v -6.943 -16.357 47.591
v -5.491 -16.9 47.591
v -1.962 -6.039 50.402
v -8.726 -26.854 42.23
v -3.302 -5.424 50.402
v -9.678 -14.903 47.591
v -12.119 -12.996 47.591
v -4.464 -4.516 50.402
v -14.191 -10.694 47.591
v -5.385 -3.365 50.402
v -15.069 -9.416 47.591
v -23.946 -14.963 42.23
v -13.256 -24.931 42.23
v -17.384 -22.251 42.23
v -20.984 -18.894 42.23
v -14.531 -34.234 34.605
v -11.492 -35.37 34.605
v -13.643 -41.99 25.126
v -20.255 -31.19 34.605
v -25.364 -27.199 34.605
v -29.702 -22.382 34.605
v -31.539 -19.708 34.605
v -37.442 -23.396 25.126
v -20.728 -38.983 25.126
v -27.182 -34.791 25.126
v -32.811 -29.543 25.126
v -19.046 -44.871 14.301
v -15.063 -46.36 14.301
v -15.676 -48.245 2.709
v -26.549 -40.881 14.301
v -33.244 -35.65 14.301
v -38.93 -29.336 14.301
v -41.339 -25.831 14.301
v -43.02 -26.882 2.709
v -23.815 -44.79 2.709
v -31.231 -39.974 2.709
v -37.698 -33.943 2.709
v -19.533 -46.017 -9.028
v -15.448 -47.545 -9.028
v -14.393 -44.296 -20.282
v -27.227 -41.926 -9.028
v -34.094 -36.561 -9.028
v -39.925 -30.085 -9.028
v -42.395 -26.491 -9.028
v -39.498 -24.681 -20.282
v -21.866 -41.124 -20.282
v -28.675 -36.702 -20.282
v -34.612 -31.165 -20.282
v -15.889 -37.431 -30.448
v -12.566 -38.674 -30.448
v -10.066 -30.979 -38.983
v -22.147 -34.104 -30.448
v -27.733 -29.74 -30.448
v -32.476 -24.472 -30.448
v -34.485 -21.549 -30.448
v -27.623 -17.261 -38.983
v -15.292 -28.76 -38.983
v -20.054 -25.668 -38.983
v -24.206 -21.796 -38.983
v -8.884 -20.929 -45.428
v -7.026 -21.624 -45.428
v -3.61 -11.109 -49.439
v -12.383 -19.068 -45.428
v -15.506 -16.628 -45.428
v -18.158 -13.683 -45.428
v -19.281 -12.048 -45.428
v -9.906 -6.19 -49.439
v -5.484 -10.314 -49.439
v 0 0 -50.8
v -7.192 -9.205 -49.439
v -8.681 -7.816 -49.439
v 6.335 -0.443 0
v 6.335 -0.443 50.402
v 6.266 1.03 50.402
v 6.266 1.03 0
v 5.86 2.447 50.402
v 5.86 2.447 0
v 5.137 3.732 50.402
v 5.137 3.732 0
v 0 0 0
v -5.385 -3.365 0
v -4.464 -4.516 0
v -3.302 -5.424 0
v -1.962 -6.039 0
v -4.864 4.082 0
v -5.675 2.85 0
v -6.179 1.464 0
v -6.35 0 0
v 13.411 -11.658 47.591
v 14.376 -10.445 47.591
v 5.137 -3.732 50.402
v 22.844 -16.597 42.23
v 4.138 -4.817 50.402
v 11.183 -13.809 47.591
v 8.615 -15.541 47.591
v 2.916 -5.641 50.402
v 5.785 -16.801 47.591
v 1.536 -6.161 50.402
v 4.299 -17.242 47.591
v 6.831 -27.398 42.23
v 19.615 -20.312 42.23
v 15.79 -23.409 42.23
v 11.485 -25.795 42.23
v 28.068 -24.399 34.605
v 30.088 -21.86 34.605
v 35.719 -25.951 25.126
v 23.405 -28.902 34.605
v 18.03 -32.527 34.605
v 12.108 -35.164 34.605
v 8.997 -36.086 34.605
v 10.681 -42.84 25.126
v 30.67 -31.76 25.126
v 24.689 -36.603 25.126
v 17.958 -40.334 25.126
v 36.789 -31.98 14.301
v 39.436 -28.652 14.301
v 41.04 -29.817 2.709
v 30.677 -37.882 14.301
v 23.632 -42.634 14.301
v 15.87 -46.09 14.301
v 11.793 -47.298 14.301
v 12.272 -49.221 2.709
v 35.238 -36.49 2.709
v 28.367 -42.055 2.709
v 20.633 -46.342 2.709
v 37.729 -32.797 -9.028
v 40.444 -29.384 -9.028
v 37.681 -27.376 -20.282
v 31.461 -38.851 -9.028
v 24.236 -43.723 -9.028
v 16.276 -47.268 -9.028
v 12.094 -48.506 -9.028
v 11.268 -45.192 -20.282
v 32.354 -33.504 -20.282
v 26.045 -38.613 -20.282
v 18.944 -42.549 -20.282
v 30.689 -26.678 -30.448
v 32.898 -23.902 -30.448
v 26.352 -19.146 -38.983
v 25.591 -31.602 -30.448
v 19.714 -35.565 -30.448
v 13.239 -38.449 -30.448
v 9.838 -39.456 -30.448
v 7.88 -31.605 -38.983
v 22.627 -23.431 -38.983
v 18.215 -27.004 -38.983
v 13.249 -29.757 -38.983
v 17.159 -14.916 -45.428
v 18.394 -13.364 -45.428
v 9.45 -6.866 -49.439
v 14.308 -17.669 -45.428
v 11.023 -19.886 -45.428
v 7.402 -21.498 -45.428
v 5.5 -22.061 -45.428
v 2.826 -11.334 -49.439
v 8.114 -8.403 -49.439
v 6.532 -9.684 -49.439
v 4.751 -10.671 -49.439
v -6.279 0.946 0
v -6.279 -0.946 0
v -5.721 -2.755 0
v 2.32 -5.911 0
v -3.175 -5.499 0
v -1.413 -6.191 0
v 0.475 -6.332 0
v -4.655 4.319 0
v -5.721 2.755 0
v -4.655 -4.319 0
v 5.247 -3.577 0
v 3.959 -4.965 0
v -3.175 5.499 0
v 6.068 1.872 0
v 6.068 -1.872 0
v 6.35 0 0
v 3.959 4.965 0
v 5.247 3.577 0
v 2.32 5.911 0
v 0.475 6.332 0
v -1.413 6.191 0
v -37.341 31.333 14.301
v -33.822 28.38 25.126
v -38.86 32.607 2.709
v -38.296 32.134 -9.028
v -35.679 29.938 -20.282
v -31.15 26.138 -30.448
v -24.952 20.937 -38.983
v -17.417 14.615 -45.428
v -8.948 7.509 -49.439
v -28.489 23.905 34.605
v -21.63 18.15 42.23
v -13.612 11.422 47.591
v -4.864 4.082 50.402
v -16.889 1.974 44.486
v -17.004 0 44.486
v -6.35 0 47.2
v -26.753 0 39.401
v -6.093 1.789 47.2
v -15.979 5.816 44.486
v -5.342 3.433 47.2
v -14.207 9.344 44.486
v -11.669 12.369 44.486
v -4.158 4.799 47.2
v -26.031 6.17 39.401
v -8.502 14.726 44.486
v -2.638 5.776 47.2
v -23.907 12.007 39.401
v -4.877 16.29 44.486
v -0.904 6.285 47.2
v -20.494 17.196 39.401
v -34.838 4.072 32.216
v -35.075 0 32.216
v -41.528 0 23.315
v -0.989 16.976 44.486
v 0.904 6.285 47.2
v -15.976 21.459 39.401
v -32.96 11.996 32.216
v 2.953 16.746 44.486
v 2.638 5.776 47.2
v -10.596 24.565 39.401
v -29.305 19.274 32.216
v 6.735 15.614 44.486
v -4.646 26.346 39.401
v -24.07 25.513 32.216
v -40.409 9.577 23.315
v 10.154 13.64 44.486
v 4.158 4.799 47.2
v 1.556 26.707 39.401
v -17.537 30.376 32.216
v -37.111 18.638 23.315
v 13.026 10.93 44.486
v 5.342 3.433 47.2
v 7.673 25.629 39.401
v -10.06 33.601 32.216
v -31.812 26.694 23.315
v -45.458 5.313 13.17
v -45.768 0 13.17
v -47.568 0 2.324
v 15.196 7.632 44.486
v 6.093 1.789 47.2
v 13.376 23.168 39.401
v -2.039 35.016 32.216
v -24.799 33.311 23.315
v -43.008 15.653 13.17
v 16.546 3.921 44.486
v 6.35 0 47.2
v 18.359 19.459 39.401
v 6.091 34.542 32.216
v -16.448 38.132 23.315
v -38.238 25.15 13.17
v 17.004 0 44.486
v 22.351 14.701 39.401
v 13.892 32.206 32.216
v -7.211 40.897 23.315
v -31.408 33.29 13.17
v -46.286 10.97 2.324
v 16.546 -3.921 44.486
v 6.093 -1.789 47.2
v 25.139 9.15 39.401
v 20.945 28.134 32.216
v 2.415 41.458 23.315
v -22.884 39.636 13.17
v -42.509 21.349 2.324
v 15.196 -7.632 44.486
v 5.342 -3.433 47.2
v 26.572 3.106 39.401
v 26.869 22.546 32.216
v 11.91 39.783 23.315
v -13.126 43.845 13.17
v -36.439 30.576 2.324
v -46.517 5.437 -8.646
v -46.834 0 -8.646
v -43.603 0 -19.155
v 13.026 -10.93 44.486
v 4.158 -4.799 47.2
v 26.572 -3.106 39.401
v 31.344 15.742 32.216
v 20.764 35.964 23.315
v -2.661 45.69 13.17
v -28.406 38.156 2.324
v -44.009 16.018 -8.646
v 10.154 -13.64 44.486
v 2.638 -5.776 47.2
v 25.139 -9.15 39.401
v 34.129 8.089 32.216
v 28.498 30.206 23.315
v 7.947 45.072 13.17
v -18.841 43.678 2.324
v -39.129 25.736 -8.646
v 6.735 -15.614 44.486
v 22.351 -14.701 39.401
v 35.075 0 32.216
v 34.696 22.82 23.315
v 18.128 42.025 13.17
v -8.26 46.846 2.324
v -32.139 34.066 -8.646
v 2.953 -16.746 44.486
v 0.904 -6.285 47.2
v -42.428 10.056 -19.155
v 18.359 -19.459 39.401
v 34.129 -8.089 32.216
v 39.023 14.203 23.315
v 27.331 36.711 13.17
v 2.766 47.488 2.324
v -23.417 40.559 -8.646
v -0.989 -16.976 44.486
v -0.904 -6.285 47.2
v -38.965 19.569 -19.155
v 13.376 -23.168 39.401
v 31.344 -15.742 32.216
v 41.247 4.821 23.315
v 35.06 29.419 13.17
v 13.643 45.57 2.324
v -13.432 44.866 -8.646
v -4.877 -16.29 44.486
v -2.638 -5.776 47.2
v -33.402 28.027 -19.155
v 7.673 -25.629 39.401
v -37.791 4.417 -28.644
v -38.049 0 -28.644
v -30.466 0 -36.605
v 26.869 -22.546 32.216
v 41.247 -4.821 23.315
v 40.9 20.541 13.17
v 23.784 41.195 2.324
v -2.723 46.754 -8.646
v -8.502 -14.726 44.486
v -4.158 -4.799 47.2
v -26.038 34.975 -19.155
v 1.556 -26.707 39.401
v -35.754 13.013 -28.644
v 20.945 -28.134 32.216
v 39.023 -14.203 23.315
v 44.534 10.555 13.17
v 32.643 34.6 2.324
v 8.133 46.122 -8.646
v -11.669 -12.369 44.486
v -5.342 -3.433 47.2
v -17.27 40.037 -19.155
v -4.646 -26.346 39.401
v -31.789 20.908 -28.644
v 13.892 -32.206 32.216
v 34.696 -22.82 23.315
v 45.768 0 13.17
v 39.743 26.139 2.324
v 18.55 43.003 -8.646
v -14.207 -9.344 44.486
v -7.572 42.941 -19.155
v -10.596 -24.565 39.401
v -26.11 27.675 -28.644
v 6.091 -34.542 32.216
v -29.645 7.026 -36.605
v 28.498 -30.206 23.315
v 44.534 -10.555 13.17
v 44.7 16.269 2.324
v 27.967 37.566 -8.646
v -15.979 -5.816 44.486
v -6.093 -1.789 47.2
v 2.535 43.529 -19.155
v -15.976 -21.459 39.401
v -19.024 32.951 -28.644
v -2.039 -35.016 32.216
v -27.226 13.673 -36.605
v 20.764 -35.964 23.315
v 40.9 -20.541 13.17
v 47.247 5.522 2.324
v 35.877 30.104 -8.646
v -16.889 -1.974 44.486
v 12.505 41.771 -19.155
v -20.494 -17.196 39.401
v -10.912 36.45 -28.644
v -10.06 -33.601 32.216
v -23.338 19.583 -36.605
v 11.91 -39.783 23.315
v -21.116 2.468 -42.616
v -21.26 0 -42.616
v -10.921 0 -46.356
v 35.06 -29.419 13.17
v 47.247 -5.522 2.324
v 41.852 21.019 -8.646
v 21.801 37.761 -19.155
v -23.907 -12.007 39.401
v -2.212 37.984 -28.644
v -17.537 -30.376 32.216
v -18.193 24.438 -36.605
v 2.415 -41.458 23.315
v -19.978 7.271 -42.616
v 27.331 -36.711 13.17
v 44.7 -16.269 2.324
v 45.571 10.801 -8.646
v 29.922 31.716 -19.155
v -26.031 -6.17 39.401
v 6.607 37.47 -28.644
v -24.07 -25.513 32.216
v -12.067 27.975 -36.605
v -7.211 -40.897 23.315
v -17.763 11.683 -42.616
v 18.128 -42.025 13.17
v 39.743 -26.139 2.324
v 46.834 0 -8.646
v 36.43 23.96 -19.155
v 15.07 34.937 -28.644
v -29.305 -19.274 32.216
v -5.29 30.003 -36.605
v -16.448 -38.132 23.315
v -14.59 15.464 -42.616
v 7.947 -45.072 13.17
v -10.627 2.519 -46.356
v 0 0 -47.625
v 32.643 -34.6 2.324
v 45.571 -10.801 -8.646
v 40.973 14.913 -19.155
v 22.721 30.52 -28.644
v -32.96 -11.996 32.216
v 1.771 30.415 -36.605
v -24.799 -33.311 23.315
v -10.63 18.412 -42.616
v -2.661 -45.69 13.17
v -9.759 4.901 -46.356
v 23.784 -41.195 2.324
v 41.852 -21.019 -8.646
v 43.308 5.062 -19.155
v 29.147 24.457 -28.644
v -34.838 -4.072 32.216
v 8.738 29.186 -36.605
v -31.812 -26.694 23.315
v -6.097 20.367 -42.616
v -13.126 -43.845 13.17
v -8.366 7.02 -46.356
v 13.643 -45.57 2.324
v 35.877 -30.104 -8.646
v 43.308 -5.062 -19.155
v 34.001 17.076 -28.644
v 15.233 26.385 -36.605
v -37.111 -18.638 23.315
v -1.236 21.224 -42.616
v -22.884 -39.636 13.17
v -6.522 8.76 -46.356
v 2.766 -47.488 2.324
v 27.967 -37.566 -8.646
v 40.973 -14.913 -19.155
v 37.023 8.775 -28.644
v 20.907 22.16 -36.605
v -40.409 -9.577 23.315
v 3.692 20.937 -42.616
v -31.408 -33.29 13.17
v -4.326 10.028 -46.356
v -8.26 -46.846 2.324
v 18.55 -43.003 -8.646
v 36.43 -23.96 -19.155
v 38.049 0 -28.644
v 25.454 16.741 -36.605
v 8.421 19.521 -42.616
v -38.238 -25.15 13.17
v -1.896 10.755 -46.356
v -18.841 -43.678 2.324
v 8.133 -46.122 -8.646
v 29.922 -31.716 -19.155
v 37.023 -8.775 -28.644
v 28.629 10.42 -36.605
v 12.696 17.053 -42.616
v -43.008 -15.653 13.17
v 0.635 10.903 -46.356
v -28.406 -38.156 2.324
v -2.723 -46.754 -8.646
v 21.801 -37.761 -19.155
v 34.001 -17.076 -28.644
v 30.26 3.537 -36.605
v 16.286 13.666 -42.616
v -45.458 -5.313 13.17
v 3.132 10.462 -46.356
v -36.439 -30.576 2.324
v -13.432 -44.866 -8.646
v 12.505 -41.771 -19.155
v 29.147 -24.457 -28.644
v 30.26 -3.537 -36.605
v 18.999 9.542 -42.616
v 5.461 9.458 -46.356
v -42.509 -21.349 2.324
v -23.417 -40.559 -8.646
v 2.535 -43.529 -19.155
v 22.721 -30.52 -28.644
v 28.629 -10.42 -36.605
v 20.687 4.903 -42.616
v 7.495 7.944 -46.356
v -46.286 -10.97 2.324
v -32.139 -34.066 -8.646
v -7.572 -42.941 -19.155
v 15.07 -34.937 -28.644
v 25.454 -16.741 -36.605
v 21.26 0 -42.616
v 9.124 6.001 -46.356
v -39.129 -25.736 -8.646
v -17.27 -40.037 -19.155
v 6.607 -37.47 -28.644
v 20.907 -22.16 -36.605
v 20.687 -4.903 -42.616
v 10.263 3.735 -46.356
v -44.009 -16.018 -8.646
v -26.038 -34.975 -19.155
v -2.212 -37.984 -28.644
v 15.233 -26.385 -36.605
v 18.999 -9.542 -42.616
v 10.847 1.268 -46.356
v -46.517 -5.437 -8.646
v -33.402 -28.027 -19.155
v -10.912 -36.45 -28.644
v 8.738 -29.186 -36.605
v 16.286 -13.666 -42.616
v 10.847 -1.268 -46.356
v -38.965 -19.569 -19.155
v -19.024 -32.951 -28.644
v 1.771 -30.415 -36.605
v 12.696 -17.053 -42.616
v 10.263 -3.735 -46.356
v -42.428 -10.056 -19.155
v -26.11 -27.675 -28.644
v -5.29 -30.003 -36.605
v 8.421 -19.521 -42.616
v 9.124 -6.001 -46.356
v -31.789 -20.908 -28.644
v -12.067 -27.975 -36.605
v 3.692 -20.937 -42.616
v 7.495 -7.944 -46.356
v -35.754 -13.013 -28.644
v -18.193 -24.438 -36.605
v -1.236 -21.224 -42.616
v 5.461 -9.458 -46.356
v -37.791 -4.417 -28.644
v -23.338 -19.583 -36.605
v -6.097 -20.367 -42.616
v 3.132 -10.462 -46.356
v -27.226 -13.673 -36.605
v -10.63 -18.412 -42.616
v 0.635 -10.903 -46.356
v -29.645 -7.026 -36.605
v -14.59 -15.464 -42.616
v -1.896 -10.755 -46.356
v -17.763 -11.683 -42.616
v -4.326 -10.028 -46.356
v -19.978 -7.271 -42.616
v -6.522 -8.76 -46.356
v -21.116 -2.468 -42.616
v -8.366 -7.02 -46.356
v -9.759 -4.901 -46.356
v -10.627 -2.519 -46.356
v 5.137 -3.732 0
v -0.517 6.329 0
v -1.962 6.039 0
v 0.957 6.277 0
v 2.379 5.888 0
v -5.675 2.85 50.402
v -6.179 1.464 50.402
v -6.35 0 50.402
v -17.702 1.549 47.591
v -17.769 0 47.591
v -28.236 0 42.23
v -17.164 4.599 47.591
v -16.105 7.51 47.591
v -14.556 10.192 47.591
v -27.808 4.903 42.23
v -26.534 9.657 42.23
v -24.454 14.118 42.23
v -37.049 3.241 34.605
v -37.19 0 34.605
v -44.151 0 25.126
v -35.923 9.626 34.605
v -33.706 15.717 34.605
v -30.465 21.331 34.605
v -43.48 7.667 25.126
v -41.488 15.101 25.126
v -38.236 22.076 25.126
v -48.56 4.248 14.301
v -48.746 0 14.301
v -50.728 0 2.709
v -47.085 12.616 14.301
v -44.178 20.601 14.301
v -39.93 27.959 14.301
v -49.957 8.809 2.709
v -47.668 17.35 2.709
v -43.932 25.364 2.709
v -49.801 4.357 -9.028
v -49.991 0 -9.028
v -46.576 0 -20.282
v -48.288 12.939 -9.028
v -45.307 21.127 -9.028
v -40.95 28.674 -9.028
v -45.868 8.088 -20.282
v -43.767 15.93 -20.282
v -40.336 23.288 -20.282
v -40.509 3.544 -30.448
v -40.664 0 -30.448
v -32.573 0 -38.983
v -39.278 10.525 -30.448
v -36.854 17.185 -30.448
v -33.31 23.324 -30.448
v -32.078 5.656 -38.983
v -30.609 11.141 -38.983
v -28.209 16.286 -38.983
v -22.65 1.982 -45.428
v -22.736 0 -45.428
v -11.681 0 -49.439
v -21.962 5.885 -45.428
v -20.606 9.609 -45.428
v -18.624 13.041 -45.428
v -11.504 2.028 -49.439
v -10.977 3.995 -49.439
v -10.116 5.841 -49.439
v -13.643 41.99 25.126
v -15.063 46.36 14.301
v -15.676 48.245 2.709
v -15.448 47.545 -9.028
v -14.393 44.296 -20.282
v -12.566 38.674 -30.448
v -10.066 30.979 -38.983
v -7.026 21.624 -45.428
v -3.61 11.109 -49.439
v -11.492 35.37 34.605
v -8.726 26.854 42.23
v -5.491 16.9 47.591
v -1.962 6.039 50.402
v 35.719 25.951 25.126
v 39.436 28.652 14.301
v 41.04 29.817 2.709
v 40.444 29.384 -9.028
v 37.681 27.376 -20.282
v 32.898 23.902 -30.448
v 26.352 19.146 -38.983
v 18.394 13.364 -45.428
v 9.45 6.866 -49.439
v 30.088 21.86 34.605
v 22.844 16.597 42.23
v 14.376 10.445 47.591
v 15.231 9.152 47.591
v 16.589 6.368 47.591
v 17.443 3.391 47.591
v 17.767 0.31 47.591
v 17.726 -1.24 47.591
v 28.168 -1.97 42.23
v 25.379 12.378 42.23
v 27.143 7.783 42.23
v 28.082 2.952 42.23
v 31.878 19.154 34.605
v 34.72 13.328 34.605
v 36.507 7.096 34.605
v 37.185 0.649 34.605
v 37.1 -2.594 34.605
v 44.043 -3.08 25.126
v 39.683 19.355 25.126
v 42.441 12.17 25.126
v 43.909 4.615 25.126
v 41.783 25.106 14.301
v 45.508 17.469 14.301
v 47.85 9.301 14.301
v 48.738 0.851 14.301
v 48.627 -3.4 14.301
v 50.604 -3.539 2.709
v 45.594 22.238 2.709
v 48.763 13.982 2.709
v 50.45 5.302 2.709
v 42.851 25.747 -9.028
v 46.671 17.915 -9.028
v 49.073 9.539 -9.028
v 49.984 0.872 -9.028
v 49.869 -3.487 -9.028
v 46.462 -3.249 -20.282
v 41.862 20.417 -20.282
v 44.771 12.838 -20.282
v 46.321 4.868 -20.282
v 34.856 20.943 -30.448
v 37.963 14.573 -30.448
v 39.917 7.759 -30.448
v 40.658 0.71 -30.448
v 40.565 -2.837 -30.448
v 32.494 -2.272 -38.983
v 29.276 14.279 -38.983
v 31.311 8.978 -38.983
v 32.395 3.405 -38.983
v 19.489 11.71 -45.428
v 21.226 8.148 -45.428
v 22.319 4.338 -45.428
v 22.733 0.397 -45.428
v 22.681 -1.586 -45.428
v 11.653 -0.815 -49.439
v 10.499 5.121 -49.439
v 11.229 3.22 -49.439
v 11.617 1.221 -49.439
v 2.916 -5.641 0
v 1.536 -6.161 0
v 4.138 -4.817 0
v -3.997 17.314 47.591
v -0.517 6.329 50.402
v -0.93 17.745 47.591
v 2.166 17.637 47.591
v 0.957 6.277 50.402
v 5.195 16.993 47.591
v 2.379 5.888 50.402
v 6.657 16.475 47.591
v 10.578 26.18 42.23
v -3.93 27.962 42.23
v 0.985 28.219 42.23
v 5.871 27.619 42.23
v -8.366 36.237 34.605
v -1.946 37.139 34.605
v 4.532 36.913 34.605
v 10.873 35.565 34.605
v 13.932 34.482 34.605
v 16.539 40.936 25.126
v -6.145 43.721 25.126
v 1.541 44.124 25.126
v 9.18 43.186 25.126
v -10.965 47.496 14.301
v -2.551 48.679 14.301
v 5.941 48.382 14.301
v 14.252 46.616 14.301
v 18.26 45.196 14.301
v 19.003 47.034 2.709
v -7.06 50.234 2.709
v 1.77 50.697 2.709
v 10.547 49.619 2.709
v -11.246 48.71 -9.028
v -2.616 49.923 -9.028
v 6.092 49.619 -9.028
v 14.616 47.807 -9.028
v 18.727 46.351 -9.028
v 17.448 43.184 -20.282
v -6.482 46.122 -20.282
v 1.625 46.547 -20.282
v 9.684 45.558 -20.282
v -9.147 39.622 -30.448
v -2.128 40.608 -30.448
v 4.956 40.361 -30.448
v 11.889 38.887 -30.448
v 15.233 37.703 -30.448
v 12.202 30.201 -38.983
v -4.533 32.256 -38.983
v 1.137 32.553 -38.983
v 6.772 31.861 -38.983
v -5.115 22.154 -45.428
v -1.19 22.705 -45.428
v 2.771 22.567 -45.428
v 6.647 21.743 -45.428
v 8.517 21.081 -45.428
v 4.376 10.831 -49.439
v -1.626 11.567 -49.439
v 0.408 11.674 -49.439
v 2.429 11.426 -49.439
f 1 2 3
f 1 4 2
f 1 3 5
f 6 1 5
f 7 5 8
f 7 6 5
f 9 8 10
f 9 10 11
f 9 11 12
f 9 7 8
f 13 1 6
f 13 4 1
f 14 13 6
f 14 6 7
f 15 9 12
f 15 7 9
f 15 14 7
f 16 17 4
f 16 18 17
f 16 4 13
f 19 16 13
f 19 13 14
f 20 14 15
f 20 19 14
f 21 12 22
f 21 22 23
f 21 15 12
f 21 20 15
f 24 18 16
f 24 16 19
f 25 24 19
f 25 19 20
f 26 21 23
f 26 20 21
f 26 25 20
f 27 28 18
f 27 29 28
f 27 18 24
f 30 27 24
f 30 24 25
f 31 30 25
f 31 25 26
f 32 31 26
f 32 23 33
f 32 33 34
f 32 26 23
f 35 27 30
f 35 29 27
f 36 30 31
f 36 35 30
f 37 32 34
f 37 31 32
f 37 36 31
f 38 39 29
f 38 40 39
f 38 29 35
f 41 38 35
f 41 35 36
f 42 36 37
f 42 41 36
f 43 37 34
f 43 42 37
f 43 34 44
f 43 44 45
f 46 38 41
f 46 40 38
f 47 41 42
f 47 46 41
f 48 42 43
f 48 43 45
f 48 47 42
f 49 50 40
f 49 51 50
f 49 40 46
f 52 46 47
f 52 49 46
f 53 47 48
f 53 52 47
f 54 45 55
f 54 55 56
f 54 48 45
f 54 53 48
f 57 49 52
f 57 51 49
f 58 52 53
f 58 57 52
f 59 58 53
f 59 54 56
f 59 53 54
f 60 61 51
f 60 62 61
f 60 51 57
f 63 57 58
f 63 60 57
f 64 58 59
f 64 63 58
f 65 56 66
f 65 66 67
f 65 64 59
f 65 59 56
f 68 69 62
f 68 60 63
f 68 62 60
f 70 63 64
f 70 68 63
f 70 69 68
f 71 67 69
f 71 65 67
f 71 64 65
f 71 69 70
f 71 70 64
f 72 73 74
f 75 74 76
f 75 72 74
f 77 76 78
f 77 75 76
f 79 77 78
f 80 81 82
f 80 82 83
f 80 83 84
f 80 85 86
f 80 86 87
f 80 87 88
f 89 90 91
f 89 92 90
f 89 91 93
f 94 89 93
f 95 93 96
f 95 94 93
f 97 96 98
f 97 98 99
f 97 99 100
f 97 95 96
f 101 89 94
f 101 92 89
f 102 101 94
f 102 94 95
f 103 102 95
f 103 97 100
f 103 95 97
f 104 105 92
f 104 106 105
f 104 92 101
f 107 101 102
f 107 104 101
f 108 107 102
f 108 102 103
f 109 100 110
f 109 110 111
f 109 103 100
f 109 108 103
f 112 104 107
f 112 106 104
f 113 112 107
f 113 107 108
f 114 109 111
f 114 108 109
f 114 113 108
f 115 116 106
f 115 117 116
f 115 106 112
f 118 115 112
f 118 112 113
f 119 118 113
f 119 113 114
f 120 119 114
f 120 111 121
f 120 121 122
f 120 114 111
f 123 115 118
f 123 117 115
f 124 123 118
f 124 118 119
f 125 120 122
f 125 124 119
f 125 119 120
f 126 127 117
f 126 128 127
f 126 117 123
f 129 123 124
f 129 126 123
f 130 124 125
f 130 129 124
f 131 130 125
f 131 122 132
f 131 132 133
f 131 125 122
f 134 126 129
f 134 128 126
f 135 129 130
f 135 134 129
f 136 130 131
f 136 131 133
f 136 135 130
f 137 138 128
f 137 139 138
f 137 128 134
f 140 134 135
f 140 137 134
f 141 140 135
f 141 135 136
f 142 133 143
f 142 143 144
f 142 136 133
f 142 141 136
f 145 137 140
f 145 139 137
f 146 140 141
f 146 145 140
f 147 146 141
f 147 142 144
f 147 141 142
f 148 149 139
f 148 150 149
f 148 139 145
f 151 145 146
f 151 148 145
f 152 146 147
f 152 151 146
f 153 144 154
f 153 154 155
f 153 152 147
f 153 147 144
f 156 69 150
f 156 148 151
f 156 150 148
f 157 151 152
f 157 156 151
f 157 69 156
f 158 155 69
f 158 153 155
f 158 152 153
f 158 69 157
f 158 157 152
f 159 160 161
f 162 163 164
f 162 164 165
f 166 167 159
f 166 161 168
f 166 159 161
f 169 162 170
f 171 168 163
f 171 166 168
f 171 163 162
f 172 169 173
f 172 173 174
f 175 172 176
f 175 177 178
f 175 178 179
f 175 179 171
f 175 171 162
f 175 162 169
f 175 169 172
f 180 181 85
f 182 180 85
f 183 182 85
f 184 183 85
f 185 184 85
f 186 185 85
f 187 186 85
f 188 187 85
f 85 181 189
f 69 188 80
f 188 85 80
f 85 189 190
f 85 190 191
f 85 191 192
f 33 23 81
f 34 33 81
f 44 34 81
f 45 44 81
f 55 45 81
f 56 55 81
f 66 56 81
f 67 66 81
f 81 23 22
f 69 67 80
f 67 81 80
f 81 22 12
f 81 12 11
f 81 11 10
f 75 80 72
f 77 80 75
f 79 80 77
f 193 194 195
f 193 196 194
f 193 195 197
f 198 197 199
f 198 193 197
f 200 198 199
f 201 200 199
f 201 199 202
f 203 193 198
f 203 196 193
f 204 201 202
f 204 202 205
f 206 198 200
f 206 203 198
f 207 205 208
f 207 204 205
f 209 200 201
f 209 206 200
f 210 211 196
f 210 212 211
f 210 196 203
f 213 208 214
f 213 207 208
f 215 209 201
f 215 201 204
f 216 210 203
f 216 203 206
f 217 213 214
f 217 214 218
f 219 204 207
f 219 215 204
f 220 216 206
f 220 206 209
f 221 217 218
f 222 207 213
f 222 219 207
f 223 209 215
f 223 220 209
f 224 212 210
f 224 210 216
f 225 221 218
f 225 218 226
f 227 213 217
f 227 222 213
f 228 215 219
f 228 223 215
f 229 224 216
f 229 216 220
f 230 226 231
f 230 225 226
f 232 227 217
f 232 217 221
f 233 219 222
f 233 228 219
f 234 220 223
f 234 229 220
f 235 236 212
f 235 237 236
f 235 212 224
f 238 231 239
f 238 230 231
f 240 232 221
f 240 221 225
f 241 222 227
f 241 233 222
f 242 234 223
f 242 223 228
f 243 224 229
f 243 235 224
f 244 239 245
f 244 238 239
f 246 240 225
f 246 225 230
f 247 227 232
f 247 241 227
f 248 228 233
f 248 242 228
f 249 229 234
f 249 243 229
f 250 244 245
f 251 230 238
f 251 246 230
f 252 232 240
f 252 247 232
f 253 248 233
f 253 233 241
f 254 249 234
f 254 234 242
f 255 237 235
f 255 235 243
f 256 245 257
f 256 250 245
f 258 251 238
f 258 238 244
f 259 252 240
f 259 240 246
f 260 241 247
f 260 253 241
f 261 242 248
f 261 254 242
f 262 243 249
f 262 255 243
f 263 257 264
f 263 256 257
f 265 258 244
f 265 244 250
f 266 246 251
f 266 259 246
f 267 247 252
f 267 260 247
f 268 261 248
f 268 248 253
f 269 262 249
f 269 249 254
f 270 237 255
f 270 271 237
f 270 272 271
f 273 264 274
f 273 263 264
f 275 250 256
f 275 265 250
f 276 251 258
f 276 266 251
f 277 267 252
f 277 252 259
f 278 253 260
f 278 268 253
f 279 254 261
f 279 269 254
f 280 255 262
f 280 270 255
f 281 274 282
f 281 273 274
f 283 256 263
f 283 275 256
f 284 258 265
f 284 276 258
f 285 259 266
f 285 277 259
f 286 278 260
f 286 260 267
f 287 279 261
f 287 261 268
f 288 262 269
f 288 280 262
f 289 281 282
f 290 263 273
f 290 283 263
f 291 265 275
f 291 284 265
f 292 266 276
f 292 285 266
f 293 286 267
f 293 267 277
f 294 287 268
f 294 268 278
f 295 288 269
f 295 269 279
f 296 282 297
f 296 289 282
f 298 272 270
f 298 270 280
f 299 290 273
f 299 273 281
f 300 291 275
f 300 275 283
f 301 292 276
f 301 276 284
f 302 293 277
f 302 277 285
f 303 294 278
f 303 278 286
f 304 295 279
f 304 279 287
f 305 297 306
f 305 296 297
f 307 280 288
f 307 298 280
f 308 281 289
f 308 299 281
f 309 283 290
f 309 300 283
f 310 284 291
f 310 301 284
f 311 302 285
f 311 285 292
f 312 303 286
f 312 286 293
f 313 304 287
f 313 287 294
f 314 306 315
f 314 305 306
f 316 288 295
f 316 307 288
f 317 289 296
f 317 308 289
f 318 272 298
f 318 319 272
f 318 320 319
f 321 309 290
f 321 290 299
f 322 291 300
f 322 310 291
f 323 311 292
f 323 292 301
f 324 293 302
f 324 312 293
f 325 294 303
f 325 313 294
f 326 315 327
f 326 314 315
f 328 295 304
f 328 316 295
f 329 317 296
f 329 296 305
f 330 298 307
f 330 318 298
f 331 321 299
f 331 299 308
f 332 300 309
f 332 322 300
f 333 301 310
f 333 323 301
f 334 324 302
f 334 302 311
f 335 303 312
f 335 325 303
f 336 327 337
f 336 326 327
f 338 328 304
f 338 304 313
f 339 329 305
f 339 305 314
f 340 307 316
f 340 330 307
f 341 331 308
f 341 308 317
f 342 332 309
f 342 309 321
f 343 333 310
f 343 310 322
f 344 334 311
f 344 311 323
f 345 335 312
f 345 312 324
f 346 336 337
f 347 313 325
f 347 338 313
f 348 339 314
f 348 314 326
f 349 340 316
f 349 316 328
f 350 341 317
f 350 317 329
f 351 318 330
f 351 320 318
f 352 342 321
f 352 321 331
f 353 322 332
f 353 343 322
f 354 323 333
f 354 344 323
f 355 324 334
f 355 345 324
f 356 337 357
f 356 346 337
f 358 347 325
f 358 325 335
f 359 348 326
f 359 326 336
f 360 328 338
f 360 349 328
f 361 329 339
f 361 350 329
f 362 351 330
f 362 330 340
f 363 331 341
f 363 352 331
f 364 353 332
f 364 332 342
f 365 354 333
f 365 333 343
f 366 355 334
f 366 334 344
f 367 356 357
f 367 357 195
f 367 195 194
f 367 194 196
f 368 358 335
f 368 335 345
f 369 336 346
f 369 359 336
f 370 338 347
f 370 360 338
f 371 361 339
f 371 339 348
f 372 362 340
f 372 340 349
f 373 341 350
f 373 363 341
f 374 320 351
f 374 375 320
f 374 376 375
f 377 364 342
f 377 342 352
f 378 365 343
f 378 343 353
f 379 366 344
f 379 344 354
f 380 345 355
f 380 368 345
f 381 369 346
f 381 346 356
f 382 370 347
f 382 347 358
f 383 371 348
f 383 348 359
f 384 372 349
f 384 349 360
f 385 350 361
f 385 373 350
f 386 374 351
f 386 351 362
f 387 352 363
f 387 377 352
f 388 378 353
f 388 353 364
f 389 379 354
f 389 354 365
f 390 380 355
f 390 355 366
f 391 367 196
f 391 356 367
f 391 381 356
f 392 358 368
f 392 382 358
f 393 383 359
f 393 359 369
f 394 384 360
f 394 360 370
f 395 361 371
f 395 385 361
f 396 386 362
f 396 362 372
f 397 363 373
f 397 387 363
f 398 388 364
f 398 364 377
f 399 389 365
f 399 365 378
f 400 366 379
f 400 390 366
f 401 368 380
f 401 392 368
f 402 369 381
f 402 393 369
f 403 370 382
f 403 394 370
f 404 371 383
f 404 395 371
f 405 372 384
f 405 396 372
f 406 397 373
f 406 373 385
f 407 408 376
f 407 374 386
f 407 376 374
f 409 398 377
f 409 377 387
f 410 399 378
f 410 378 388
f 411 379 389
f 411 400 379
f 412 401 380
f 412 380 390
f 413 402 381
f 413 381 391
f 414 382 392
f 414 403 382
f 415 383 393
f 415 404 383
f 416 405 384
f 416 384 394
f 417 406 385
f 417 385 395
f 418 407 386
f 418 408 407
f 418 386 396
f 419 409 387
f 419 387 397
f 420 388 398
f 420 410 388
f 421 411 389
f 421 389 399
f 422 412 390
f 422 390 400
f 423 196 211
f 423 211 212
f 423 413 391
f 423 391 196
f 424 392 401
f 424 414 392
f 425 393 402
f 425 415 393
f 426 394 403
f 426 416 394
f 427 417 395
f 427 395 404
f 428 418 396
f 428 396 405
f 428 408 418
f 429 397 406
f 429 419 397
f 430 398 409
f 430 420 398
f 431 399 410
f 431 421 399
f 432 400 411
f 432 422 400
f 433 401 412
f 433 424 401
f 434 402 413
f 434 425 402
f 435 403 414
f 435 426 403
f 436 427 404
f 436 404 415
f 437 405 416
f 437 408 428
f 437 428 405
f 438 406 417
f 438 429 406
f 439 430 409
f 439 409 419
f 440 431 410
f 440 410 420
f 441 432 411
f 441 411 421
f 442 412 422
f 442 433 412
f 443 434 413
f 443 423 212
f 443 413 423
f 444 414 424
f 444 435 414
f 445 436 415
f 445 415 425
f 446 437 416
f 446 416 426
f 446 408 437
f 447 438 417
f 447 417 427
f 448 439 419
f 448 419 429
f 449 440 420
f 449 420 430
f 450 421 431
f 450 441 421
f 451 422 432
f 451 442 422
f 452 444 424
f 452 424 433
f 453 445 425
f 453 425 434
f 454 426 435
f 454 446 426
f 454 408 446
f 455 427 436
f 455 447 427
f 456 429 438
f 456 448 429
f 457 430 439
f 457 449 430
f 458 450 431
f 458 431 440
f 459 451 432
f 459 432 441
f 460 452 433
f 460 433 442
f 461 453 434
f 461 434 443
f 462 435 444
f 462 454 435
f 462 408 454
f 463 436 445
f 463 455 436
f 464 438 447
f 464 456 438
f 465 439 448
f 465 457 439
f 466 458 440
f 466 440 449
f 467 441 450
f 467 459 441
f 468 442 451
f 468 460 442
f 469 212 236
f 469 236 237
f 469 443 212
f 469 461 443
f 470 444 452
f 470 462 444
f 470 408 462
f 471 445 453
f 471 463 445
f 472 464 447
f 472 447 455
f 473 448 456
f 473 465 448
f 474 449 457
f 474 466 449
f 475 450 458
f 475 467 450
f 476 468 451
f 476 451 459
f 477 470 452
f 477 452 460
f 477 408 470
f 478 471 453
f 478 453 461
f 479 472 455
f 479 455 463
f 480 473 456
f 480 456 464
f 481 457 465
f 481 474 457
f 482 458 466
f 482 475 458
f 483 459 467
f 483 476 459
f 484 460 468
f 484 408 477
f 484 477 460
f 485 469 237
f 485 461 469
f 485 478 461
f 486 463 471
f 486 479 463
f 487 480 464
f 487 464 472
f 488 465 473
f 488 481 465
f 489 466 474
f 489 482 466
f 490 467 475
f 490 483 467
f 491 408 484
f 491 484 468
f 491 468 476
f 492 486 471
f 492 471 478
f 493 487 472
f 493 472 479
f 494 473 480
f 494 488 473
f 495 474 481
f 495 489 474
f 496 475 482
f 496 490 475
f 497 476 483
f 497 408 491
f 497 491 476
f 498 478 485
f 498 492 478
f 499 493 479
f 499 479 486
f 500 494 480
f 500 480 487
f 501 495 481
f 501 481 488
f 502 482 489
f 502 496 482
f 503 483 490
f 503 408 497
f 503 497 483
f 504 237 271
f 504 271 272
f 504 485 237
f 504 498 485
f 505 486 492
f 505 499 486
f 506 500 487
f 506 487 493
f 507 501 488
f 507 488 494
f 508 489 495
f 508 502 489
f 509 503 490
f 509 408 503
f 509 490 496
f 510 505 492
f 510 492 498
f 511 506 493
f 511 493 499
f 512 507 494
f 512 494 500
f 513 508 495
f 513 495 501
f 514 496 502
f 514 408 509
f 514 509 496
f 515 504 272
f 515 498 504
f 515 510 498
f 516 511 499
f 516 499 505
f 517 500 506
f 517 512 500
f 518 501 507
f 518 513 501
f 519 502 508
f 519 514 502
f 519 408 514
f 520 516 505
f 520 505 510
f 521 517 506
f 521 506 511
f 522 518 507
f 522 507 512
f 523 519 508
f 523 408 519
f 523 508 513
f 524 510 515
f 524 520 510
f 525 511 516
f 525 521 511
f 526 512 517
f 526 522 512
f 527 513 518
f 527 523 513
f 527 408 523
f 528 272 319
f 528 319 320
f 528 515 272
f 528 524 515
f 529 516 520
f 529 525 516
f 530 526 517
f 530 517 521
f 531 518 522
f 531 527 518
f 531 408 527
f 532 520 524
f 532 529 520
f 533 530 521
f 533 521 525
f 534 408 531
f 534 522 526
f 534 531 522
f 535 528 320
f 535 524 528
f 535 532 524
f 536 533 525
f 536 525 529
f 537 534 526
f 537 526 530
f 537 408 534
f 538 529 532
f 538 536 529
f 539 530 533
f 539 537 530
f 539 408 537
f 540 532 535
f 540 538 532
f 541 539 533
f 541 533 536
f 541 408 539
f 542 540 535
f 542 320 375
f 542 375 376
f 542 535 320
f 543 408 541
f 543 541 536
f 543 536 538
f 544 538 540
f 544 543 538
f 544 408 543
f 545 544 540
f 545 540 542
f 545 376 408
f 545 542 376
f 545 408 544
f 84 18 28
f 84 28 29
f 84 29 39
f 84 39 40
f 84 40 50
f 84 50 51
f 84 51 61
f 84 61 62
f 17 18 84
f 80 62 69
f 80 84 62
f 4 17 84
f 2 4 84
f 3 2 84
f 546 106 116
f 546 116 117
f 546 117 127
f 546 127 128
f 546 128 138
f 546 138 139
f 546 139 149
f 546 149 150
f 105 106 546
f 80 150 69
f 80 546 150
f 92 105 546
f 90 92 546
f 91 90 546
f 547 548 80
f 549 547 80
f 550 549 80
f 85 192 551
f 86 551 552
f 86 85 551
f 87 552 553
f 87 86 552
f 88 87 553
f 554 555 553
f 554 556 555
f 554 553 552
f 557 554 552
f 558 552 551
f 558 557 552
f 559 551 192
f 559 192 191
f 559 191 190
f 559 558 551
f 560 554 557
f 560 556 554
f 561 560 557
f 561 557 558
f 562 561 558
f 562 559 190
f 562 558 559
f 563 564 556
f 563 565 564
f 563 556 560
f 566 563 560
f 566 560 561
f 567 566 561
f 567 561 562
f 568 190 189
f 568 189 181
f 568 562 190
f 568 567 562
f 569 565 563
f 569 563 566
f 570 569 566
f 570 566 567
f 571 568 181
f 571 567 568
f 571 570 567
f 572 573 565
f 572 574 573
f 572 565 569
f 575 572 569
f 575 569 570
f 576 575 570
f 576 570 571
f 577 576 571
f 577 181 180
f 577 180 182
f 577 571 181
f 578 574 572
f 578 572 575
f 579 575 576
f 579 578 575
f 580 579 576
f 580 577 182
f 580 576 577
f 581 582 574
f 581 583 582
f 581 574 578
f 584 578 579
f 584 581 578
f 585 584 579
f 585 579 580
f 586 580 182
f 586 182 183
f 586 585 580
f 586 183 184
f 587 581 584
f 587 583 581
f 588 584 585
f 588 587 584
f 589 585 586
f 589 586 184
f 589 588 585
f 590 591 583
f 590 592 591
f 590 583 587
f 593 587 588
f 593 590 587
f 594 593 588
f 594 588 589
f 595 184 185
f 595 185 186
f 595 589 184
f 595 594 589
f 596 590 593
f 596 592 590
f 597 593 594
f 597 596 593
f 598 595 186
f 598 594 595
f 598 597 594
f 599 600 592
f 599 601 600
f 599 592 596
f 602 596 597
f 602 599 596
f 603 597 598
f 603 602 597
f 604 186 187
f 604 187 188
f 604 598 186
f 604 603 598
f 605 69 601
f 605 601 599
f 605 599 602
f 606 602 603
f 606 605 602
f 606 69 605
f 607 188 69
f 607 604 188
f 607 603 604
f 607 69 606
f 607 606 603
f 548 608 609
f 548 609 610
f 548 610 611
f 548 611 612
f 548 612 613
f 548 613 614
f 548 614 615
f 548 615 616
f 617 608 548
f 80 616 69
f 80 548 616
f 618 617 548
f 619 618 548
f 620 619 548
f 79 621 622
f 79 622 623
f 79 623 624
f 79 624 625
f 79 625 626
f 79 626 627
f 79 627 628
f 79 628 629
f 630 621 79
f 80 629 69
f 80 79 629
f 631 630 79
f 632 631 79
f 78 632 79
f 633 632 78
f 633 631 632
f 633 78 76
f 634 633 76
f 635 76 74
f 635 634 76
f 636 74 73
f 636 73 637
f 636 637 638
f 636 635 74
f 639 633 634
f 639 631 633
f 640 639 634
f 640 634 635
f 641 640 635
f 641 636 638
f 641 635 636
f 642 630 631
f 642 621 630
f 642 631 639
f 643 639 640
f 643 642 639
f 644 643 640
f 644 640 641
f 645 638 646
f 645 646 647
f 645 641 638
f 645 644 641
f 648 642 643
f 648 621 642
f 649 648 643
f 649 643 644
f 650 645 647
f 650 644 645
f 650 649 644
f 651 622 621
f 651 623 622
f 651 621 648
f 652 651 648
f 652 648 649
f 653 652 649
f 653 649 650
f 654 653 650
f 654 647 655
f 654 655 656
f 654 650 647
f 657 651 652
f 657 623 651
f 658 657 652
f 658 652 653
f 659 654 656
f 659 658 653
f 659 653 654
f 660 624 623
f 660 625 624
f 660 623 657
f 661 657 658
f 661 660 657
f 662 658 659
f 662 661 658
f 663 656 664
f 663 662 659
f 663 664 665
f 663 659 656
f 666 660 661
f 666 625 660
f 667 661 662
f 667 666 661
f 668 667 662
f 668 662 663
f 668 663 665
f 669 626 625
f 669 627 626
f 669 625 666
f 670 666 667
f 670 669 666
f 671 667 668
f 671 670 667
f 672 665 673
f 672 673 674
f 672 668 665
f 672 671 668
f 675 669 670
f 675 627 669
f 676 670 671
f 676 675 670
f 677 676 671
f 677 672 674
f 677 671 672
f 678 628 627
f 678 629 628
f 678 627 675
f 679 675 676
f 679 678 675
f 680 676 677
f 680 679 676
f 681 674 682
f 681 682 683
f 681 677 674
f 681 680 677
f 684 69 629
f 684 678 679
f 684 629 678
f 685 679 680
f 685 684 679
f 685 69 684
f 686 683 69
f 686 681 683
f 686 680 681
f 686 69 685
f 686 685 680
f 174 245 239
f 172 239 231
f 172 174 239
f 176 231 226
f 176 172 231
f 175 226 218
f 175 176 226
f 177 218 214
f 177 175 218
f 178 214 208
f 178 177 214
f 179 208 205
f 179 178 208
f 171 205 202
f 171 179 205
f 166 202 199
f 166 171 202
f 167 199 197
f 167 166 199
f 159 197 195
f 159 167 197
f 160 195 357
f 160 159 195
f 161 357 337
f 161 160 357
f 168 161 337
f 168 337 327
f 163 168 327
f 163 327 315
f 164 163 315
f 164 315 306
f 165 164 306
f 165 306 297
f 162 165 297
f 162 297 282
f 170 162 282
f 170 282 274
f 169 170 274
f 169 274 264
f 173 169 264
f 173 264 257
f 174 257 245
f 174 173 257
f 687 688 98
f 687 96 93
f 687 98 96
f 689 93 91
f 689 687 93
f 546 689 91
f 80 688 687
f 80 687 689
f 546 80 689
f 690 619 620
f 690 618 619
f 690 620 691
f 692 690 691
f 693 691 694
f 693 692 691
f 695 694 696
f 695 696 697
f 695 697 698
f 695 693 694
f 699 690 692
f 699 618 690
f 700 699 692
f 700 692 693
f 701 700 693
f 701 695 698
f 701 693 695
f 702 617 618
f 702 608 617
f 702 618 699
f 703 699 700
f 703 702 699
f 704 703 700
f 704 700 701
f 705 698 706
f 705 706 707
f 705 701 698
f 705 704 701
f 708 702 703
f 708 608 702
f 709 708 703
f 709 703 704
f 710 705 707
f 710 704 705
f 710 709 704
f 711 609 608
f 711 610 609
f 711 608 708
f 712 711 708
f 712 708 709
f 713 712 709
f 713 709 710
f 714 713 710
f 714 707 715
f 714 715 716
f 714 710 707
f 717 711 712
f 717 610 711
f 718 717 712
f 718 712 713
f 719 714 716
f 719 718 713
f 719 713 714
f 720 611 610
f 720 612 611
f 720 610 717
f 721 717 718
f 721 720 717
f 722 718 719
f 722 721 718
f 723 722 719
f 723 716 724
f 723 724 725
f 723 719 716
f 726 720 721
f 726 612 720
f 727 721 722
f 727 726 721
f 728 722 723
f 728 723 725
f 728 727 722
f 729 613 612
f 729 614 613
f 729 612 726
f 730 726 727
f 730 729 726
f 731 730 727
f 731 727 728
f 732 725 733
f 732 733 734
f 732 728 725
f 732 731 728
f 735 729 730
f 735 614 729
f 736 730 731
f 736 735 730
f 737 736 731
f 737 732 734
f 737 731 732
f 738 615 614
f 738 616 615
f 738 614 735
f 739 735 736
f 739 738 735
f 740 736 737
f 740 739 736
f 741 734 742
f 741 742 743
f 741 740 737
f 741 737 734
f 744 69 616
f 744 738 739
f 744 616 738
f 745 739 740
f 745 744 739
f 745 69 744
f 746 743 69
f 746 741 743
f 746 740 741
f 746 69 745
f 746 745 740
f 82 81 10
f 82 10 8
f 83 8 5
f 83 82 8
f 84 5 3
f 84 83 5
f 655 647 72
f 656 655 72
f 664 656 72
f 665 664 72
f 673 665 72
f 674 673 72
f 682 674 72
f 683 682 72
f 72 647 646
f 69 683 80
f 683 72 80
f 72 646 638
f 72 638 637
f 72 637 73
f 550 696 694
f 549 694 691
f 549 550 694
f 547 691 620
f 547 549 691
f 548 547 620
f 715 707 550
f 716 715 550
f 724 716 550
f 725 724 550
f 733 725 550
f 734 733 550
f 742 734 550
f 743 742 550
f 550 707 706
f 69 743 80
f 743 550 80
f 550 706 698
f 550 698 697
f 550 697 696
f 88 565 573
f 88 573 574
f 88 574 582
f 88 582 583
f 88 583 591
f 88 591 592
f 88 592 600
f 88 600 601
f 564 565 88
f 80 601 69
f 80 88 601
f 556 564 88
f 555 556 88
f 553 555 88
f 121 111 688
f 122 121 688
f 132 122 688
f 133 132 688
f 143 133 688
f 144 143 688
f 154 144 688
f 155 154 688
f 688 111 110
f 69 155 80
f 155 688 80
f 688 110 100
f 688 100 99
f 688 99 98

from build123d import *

# Parameters (mm, degrees)
F1_ANGLE = 40
F2_COUNT = 5
F5_R     = 6.35
F6_DEPTH = 50.8


with BuildPart() as f1:
    # F0 (on Front) → F1 (revolve)
    with BuildSketch(Plane.XZ):
        with BuildLine():
            Line((0, -50.8), (0, 50.8))
            ThreePointArc((0, 50.8), (-50.8, 0), (0, -50.8))
        make_face()
    revolve(axis=Axis((0, 0, 0), (0, 0, -1)), revolution_arc=F1_ANGLE)


with BuildPart() as f2_1:
    # F2: instance of F1
    add(f1.part.rotate(Axis((0, 0, 0), (0, 0, -1)), 1 * 360 / F2_COUNT))


with BuildPart() as f2_2:
    # F2: instance of F1
    add(f1.part.rotate(Axis((0, 0, 0), (0, 0, -1)), 2 * 360 / F2_COUNT))


with BuildPart() as f2_3:
    # F2: instance of F1
    add(f1.part.rotate(Axis((0, 0, 0), (0, 0, -1)), 3 * 360 / F2_COUNT))


with BuildPart() as f2_4:
    # F2: instance of F1
    add(f1.part.rotate(Axis((0, 0, 0), (0, 0, -1)), 4 * 360 / F2_COUNT))


with BuildPart() as f4:
    # F3 (on face) → F4 (revolve)
    with BuildSketch(Plane.XZ):
        with BuildLine():
            Line((0, -47.625), (0, 47.625))
            ThreePointArc((0, 47.625), (-47.625, 0), (0, -47.625))
        make_face()
    revolve(axis=Axis((0, 0, 0), (0, 0, -1)))


with BuildPart() as f6_tool:
    # F5 (on Top) → F6 (new body)
    with BuildSketch(Plane.XY):
        Circle(F5_R)
    extrude(amount=F6_DEPTH)


with BuildPart() as f1_1:
    add(f1.part)

    # F6: cut by f6_tool
    add(f6_tool.part, mode=Mode.SUBTRACT)


with BuildPart() as f2_1_1:
    add(f2_1.part)

    # F6: cut by f6_tool
    add(f6_tool.part, mode=Mode.SUBTRACT)


with BuildPart() as f2_2_1:
    add(f2_2.part)

    # F6: cut by f6_tool
    add(f6_tool.part, mode=Mode.SUBTRACT)


with BuildPart() as f2_3_1:
    add(f2_3.part)

    # F6: cut by f6_tool
    add(f6_tool.part, mode=Mode.SUBTRACT)


with BuildPart() as f2_4_1:
    add(f2_4.part)

    # F6: cut by f6_tool
    add(f6_tool.part, mode=Mode.SUBTRACT)


with BuildPart() as f4_1:
    add(f4.part)

    # F6: cut by f6_tool
    add(f6_tool.part, mode=Mode.SUBTRACT)


solid = Compound([f1_1.part, f2_1_1.part, f2_2_1.part, f2_3_1.part, f2_4_1.part, f4_1.part])
